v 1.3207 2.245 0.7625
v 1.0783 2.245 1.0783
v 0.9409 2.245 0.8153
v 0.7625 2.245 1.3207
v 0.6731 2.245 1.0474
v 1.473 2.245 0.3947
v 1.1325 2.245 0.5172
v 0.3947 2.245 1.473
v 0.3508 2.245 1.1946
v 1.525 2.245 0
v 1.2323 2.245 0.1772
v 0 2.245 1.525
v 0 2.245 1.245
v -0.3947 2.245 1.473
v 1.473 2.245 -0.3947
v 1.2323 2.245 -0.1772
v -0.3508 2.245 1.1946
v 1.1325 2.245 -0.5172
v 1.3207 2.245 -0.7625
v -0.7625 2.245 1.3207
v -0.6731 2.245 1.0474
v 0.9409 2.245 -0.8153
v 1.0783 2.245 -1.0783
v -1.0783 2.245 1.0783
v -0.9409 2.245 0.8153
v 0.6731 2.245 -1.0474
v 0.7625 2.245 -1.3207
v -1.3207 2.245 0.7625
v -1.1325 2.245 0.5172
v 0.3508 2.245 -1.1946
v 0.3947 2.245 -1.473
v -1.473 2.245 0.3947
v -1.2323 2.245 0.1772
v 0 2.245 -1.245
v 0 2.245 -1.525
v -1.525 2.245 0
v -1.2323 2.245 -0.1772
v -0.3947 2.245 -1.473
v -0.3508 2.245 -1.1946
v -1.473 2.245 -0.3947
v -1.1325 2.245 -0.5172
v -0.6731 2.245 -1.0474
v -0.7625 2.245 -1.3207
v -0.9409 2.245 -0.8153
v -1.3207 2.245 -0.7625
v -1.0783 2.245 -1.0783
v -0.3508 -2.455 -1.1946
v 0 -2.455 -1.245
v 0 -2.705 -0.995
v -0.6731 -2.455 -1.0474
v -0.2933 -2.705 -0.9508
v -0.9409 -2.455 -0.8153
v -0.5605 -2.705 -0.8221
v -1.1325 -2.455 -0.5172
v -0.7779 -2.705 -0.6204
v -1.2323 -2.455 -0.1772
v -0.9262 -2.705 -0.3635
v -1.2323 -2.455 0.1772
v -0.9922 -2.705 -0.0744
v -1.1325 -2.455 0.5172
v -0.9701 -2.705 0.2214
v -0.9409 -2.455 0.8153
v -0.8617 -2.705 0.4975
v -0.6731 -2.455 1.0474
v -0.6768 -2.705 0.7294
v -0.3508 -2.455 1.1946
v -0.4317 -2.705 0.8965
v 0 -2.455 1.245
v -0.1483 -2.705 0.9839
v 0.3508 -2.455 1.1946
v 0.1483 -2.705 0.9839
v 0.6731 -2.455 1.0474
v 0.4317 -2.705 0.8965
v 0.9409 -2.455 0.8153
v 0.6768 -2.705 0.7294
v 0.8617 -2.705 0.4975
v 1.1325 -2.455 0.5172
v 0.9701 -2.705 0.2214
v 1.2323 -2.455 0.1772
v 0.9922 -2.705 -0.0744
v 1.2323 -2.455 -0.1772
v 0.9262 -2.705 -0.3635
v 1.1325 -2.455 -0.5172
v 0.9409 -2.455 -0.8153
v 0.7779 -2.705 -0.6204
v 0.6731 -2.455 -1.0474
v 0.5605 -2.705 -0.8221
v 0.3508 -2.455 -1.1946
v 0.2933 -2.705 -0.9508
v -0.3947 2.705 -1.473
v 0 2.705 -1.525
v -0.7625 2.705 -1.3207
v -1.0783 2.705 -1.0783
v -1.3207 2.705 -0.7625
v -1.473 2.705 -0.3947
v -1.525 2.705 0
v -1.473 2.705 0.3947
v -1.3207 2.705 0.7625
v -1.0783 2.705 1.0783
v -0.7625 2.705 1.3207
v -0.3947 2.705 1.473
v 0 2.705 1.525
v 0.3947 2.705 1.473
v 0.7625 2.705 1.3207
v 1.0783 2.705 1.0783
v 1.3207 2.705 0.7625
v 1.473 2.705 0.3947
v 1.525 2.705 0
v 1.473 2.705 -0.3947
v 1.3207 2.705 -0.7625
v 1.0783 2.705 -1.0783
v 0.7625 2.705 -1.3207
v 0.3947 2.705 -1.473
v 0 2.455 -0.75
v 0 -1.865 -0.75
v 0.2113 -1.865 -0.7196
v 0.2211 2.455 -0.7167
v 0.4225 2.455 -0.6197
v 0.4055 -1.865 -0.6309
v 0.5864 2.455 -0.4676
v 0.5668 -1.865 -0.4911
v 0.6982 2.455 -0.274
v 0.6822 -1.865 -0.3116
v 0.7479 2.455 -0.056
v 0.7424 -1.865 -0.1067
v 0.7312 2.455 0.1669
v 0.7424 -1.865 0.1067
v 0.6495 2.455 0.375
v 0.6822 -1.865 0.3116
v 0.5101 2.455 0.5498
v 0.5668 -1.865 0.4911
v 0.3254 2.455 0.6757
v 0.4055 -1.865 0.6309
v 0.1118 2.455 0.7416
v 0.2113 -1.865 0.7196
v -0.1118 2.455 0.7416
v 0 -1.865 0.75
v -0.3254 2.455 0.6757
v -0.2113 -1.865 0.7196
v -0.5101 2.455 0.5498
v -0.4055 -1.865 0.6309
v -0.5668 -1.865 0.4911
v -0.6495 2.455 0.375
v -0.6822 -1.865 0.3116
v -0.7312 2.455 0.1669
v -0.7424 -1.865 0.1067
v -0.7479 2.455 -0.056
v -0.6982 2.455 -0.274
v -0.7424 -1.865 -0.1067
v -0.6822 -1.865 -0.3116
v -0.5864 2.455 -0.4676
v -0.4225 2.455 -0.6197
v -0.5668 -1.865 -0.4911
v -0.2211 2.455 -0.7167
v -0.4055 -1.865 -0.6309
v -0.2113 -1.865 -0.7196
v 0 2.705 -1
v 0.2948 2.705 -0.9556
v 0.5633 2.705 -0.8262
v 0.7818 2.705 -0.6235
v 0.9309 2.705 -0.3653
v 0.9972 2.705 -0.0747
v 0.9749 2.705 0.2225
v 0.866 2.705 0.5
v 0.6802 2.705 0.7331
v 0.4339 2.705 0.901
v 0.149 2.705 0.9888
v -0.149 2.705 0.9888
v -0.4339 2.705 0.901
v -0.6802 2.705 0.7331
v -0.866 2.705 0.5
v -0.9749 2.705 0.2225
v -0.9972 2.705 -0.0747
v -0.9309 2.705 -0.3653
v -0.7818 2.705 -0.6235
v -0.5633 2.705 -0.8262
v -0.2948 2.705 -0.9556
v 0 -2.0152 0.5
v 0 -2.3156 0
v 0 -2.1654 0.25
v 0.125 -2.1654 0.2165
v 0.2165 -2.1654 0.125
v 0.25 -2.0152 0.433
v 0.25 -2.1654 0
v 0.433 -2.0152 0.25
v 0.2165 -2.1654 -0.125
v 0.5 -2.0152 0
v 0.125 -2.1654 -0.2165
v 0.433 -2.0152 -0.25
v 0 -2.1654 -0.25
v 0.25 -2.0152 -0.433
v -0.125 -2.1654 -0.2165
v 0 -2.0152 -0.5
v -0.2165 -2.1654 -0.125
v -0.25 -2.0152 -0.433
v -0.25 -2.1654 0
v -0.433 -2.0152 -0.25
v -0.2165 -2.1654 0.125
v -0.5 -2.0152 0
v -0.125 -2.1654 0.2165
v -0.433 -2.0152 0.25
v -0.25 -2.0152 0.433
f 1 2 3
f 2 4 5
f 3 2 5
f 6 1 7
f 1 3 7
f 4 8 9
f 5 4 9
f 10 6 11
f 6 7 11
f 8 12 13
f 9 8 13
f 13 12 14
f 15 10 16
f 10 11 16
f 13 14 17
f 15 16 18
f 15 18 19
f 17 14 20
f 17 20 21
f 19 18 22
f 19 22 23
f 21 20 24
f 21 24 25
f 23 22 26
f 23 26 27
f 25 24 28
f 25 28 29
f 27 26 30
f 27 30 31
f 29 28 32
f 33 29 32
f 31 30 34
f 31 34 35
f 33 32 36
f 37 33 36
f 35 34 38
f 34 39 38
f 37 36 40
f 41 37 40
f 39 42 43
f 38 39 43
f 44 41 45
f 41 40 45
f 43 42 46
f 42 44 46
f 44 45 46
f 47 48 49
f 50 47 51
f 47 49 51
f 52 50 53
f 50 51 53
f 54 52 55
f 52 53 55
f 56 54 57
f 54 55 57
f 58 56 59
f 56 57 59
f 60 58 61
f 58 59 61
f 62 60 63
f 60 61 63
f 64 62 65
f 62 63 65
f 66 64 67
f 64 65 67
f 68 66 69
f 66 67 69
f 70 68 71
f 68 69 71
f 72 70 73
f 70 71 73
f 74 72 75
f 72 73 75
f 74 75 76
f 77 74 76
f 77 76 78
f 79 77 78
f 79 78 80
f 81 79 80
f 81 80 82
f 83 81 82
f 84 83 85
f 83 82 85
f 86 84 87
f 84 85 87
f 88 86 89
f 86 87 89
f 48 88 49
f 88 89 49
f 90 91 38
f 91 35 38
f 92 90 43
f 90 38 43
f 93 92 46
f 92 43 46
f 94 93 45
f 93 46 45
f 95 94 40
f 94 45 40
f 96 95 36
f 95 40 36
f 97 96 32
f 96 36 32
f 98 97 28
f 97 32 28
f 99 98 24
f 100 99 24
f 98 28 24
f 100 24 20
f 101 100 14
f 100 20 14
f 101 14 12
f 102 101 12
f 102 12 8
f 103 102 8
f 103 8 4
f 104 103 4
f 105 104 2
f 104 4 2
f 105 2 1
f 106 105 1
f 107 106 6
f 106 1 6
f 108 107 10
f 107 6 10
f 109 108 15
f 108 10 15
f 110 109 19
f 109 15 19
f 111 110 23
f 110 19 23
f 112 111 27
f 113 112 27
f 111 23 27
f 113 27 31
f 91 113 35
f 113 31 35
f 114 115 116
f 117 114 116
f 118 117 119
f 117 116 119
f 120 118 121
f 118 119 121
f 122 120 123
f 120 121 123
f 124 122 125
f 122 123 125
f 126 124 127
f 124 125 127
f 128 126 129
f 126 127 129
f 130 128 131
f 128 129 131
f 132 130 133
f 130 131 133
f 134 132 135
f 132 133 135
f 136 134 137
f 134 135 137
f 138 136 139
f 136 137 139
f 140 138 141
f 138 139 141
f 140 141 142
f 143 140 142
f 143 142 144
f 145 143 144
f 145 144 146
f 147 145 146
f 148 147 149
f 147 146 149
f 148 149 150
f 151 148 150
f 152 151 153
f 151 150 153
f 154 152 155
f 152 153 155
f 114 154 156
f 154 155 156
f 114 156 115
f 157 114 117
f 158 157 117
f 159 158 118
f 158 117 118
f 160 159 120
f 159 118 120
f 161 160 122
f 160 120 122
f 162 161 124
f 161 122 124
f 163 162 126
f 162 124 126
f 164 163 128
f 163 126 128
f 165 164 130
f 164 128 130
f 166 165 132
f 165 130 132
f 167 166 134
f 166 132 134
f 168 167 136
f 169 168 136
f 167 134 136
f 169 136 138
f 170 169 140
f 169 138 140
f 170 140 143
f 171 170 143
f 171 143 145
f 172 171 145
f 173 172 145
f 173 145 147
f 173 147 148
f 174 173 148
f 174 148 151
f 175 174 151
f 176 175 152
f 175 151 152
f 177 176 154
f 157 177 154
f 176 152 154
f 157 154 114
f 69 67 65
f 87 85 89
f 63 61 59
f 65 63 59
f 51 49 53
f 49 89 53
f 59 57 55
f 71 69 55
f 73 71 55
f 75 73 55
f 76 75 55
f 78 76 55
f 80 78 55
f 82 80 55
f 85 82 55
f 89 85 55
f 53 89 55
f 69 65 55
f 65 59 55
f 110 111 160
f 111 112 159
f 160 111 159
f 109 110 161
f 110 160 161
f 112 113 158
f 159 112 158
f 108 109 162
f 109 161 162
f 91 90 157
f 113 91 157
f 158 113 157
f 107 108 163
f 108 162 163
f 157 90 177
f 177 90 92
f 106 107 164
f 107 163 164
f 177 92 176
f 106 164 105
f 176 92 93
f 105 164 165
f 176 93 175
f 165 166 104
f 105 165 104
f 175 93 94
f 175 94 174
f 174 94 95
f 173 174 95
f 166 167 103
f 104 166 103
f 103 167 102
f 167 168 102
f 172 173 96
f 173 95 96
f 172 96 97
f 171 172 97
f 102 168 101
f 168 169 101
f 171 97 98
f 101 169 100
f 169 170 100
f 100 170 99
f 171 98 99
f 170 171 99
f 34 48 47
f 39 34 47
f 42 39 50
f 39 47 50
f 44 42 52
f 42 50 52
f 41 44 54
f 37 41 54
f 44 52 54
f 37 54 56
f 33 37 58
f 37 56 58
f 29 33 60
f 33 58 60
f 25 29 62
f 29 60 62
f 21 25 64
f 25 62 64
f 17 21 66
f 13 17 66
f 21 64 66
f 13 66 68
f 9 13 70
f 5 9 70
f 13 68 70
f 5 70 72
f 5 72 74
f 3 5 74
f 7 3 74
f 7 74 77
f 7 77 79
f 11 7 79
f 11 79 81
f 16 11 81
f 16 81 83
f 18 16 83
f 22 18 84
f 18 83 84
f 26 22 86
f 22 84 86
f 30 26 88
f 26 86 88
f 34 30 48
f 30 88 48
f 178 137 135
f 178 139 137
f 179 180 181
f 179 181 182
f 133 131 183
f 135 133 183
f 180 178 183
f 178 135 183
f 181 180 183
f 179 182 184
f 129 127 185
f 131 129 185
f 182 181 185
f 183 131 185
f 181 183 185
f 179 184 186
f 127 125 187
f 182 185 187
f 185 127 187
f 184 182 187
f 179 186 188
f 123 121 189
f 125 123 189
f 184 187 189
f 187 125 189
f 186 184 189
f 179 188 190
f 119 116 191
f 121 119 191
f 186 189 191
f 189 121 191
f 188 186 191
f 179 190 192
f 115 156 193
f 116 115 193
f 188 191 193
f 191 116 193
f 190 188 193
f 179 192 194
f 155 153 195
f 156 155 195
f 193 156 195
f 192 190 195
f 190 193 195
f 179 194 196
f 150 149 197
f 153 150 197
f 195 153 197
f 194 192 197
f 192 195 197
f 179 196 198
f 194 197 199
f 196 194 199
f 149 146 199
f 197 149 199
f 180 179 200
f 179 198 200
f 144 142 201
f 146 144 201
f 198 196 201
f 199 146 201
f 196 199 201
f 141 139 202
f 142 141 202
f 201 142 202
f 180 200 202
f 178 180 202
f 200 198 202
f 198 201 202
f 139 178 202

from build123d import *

# Parameters (mm, degrees)
F_1_5_1_5_DIAMETER_HOLE1_D     = 1.5
F_1_5_1_5_DIAMETER_HOLE1_DEPTH = 4.57
F_1_5_1_5_DIAMETER_HOLE1_TIP   = 0.450645464
CHAMFER1_SIZE                  = 0.25
CHAMFER2_SIZE                  = 0.25


with BuildPart() as part:
    # Sketch1 → Revolve1 (revolve)
    with BuildSketch(Plane(origin=(0, 0, 0), x_dir=(0, 0, -1), z_dir=(1, 0, 0))):
        Polygon((0, 2.705), (1.525, 2.705), (1.525, 2.245), (1.245, 2.245), (1.245, -2.705), (0, -2.705), align=None)
    revolve(axis=Axis((0, 0, 0), (0, 1, 0)))

    # Ø1.5 (1.5) Diameter Hole1
    with Locations(Plane.ZX.offset(2.705)):
        with Locations((0, 0)):
            Hole(F_1_5_1_5_DIAMETER_HOLE1_D / 2, depth=F_1_5_1_5_DIAMETER_HOLE1_DEPTH)
            with Locations((0, 0, -(F_1_5_1_5_DIAMETER_HOLE1_DEPTH + F_1_5_1_5_DIAMETER_HOLE1_TIP / 2))):  # 118° drill point
                Cone(0, F_1_5_1_5_DIAMETER_HOLE1_D / 2, F_1_5_1_5_DIAMETER_HOLE1_TIP, mode=Mode.SUBTRACT)

    # Chamfer1
    chamfer1_edges = [part.edges().sort_by_distance(p)[0] for p in [
        (0, -2.705, 1.245),
    ]]
    chamfer(chamfer1_edges, length=CHAMFER1_SIZE)

    # Chamfer2
    chamfer2_edges = [part.edges().sort_by_distance(p)[0] for p in [
        (0, 2.705, 0.75),
    ]]
    chamfer(chamfer2_edges, length=CHAMFER2_SIZE)


solid = part.part
